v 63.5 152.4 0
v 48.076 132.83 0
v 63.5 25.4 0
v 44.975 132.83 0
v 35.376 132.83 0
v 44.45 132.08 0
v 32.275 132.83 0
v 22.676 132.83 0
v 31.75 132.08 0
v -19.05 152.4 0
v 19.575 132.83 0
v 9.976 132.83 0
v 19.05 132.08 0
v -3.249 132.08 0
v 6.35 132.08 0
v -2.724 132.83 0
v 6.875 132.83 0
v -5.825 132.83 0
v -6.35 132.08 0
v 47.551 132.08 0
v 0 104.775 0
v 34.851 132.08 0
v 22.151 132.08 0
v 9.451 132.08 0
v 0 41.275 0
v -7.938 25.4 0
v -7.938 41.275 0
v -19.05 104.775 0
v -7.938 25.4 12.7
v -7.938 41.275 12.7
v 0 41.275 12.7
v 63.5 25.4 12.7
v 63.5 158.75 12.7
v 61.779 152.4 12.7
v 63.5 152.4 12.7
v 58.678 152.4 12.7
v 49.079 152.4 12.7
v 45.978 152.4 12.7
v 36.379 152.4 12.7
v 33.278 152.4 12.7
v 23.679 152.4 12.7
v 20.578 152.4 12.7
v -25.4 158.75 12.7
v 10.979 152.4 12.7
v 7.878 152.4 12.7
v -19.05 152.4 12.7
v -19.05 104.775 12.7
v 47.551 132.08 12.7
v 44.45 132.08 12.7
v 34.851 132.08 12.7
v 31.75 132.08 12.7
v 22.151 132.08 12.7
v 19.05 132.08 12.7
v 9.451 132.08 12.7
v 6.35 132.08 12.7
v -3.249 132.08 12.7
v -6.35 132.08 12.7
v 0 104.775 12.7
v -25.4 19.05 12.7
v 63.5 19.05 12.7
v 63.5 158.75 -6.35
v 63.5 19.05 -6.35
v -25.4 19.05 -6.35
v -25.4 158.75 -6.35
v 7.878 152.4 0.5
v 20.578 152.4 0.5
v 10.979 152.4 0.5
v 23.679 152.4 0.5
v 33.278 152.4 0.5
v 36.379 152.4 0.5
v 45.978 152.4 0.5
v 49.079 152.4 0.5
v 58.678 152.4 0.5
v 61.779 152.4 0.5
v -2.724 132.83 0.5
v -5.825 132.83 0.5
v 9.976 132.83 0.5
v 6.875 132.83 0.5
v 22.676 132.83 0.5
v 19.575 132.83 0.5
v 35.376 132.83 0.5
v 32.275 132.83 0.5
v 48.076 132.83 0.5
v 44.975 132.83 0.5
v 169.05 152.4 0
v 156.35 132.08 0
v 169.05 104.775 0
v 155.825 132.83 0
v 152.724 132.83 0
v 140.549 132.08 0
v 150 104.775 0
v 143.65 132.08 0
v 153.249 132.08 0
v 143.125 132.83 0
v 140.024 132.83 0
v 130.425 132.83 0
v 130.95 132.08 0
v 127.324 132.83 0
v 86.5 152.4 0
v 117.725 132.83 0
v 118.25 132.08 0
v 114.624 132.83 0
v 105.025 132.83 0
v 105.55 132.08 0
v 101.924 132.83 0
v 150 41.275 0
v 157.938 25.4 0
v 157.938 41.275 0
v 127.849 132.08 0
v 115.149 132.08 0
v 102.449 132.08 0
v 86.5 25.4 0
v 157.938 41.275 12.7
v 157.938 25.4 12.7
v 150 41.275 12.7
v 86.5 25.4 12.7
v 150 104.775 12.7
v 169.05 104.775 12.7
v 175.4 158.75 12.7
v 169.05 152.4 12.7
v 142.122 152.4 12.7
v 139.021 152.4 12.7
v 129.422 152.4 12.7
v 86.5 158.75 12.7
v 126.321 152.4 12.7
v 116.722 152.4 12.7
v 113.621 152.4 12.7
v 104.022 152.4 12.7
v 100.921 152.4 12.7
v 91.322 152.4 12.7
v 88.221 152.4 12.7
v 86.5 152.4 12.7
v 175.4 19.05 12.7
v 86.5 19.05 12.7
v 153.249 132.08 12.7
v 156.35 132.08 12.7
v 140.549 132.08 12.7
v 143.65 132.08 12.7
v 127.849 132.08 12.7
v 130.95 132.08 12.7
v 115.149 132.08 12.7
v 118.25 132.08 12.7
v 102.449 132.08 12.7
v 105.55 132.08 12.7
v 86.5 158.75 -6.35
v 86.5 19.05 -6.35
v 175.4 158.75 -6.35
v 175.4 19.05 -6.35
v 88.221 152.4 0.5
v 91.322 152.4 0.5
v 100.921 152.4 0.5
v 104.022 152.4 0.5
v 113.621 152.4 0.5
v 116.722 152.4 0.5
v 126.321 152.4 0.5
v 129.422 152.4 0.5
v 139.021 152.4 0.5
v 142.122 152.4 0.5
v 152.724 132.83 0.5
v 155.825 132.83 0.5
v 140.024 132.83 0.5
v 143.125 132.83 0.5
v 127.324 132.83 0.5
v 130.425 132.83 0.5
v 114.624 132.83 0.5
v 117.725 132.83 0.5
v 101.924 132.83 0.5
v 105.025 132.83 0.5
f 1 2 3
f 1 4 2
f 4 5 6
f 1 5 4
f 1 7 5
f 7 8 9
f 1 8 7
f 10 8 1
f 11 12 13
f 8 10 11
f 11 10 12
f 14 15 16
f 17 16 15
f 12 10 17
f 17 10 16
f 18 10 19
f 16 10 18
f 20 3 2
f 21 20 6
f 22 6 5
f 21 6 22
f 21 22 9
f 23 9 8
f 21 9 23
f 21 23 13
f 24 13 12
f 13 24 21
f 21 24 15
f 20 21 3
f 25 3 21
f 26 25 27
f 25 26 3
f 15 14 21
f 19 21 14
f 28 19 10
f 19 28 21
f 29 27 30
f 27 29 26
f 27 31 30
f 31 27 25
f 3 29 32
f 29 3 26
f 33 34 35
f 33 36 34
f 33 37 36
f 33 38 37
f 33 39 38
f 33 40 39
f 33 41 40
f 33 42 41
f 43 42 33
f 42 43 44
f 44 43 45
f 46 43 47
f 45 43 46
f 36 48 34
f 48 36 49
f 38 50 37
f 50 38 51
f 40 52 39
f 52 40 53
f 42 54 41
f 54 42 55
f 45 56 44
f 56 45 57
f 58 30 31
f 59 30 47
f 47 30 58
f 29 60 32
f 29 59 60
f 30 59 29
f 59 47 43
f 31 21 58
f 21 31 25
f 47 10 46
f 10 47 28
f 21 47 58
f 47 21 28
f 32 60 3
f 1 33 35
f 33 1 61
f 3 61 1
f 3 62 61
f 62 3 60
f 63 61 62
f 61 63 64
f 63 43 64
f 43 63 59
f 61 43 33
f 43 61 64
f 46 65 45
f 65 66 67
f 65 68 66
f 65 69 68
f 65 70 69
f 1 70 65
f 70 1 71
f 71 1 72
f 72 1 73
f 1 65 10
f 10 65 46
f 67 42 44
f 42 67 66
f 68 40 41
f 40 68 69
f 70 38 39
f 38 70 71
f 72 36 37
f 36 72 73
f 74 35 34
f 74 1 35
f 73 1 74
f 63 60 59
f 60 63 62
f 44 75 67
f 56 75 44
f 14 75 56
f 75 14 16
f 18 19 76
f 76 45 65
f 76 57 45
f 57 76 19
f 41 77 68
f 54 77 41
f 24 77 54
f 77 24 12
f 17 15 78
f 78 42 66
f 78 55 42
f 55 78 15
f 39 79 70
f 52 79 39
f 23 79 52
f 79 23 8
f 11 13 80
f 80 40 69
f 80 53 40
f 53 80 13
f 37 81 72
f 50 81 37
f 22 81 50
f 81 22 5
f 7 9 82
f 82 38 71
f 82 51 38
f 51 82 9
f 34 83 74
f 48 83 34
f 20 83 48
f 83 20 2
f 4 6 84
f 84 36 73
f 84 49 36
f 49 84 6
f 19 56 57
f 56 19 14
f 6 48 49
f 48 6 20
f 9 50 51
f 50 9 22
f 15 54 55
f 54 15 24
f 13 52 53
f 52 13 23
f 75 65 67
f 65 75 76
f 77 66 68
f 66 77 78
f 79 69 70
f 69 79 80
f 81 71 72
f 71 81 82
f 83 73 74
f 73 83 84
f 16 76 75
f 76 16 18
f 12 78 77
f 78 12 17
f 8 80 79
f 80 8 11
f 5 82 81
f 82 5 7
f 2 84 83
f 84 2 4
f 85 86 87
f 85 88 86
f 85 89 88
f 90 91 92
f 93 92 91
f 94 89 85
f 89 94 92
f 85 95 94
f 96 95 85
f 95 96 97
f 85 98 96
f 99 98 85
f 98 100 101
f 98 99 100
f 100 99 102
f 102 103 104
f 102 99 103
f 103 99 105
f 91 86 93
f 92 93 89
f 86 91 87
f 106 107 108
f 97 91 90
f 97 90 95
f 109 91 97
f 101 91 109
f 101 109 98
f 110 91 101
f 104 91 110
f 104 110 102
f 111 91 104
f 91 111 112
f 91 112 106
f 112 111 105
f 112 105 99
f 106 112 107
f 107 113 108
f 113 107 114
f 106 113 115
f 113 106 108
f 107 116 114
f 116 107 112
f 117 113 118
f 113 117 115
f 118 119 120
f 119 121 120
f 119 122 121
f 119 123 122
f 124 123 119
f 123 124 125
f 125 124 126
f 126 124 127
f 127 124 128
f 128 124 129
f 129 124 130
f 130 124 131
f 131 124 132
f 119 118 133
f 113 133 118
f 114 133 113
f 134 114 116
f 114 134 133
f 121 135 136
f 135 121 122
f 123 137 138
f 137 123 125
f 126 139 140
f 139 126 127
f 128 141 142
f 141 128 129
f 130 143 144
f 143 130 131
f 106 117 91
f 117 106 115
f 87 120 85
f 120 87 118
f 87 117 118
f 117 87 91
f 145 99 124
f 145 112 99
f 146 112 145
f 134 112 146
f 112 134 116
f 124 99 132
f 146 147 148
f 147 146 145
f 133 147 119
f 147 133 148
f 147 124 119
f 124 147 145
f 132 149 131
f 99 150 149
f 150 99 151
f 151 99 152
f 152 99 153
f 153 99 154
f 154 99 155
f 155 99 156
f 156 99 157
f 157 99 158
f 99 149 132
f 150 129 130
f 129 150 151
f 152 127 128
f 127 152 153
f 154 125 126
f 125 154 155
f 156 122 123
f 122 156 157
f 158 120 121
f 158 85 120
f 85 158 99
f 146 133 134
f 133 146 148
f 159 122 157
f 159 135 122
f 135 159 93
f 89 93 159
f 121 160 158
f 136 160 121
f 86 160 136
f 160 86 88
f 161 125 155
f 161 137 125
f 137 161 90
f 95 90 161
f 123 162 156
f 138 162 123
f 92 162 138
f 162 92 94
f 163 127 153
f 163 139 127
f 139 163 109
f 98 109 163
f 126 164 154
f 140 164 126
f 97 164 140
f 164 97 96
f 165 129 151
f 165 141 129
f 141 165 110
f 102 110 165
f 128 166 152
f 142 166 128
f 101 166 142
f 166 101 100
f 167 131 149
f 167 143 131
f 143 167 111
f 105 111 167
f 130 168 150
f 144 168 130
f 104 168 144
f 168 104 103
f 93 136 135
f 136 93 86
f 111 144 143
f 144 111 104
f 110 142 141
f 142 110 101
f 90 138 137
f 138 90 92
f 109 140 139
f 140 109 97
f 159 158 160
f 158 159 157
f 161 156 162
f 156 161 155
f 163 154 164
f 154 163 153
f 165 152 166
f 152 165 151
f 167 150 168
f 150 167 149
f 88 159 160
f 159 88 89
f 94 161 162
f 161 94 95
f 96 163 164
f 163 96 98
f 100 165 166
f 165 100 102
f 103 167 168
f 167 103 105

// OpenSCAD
// Transitional Craftsman Trim Header Clips

function inToMm(i) = i * 25.4;

reveal = inToMm(1/4);

length = inToMm(2);

// Casing Material [width, thickness]
casing = [inToMm(3 + 1 / 4), inToMm(1/2)];
// Header sizing. [protrusion per side, thickness, height] per entry.
header = [[inToMm(5/16), inToMm(13 / 16), casing[1]], 
          [0, casing[1], inToMm(2 + 3 / 4)], 
          [inToMm(3/4), inToMm(1 + 1/ 4), inToMm(1)]];


// Recursive function to calculate the y-axis start location of a header layer.
function headerLayerStart(target, current = 0, sum = 0) =
    (target == current) || current > len(header) - 1? 
        sum :
        headerLayerStart(target, current + 1, sum + header[current][2]);
        
function headerProtrusions() = [ for (i = [0 : len(header) - 1]) each header[i][0]];
        
function headerHeight() = headerLayerStart(len(header));
        
//color("green") sample_casing();
//sample_header();
//header_alignment_helper();

header_assembly_clip();

translate([150, 0, 0]) mirror([1, 0, 0]) header_assembly_clip();

module header_assembly_clip() {
    top_layer_protrusion = header[len(header) - 1][0];
    
    difference() {
        translate([-max(headerProtrusions()) - reveal, 0, - reveal]) {
            cube([reveal + max(headerProtrusions()) + reveal * 10, headerHeight() + reveal * 8, casing[1] + reveal]);
        }
        translate([0, reveal * 4, 0]) {
            // remove 1/4" from the upper portion for clamping effect.
            difference() {
                sample_header(outset = reveal / 2);
                translate([0 - top_layer_protrusion, headerHeight() - reveal, 0])
                    cube([top_layer_protrusion + casing[0] + length, 
                            reveal, 
                            header[len(header) - 1][1]]);
            }
        }
        // Hollow for featherboards
        translate([-top_layer_protrusion, headerLayerStart(len(header) - 1) + reveal * 4, 0]) {
            cube([top_layer_protrusion + reveal * 10, 
                    header[len(header) - 1][2] + reveal * 3, 
                    casing[1]]);
        }
        
        // Trim the extra off the bottom.
        translate([-max(headerProtrusions()) - reveal, 0, - reveal]) {
            cube([reveal + max(headerProtrusions()) + reveal * 10, reveal * 3, casing[1] + reveal]);
        }
    }
    
    // Add the featherboards
    translate([-top_layer_protrusion + reveal * 2, headerHeight() - (reveal / 5) + reveal * 4, 0]) {
        difference() {
            intersection() {
                cube([top_layer_protrusion + reveal * 8, reveal * 4 + reveal, casing[1]]);
                for (i = [0 : 2 : 8]) {
                    translate([reveal * i, 0, 0])
                        rotate([0, 0, -35]) 
                            cube([2.54, (reveal * 4) / cos(35), casing[1]]);
                }
            }
            // undercut for freedom of movement
            translate([0, 0.75, 0]) cube([top_layer_protrusion + reveal * 9, reveal * 4 - 0.75, 0.5]);
            
        }
    }
}



module header_alignment_helper() {
    translate([0 - header[0][0] - reveal, 0, 0]) {
        difference() {
            cube([header[0][0] + reveal, header[0][2] + reveal * 10, reveal]);
            translate([reveal, reveal * 9, 0]) {
                translate([0, -1, 0]) cube([header[0][0], header[0][2] + 2, reveal]);
            }
        }
    }
}


module sample_casing() {
    // round the top, flatten the bottom casing
    cube([casing[0], length, casing[1]]);
}

// Outset lets you make the parts bigger so they'll slide into a negative.
module sample_header(outset = 0) {
    for (i = [0 : len(header) - 1]) {
        ymin_outset = (i == 0) ? 0 : outset;
        ymax_outset = (i == len(header) -1) ? 0 : outset;
        translate([0 - header[i][0], headerLayerStart(i) - ymin_outset, 0])
            cube([header[i][0] + casing[0] + length, header[i][2] + ymin_outset + ymax_outset, header[i][1]]);
    }
}
